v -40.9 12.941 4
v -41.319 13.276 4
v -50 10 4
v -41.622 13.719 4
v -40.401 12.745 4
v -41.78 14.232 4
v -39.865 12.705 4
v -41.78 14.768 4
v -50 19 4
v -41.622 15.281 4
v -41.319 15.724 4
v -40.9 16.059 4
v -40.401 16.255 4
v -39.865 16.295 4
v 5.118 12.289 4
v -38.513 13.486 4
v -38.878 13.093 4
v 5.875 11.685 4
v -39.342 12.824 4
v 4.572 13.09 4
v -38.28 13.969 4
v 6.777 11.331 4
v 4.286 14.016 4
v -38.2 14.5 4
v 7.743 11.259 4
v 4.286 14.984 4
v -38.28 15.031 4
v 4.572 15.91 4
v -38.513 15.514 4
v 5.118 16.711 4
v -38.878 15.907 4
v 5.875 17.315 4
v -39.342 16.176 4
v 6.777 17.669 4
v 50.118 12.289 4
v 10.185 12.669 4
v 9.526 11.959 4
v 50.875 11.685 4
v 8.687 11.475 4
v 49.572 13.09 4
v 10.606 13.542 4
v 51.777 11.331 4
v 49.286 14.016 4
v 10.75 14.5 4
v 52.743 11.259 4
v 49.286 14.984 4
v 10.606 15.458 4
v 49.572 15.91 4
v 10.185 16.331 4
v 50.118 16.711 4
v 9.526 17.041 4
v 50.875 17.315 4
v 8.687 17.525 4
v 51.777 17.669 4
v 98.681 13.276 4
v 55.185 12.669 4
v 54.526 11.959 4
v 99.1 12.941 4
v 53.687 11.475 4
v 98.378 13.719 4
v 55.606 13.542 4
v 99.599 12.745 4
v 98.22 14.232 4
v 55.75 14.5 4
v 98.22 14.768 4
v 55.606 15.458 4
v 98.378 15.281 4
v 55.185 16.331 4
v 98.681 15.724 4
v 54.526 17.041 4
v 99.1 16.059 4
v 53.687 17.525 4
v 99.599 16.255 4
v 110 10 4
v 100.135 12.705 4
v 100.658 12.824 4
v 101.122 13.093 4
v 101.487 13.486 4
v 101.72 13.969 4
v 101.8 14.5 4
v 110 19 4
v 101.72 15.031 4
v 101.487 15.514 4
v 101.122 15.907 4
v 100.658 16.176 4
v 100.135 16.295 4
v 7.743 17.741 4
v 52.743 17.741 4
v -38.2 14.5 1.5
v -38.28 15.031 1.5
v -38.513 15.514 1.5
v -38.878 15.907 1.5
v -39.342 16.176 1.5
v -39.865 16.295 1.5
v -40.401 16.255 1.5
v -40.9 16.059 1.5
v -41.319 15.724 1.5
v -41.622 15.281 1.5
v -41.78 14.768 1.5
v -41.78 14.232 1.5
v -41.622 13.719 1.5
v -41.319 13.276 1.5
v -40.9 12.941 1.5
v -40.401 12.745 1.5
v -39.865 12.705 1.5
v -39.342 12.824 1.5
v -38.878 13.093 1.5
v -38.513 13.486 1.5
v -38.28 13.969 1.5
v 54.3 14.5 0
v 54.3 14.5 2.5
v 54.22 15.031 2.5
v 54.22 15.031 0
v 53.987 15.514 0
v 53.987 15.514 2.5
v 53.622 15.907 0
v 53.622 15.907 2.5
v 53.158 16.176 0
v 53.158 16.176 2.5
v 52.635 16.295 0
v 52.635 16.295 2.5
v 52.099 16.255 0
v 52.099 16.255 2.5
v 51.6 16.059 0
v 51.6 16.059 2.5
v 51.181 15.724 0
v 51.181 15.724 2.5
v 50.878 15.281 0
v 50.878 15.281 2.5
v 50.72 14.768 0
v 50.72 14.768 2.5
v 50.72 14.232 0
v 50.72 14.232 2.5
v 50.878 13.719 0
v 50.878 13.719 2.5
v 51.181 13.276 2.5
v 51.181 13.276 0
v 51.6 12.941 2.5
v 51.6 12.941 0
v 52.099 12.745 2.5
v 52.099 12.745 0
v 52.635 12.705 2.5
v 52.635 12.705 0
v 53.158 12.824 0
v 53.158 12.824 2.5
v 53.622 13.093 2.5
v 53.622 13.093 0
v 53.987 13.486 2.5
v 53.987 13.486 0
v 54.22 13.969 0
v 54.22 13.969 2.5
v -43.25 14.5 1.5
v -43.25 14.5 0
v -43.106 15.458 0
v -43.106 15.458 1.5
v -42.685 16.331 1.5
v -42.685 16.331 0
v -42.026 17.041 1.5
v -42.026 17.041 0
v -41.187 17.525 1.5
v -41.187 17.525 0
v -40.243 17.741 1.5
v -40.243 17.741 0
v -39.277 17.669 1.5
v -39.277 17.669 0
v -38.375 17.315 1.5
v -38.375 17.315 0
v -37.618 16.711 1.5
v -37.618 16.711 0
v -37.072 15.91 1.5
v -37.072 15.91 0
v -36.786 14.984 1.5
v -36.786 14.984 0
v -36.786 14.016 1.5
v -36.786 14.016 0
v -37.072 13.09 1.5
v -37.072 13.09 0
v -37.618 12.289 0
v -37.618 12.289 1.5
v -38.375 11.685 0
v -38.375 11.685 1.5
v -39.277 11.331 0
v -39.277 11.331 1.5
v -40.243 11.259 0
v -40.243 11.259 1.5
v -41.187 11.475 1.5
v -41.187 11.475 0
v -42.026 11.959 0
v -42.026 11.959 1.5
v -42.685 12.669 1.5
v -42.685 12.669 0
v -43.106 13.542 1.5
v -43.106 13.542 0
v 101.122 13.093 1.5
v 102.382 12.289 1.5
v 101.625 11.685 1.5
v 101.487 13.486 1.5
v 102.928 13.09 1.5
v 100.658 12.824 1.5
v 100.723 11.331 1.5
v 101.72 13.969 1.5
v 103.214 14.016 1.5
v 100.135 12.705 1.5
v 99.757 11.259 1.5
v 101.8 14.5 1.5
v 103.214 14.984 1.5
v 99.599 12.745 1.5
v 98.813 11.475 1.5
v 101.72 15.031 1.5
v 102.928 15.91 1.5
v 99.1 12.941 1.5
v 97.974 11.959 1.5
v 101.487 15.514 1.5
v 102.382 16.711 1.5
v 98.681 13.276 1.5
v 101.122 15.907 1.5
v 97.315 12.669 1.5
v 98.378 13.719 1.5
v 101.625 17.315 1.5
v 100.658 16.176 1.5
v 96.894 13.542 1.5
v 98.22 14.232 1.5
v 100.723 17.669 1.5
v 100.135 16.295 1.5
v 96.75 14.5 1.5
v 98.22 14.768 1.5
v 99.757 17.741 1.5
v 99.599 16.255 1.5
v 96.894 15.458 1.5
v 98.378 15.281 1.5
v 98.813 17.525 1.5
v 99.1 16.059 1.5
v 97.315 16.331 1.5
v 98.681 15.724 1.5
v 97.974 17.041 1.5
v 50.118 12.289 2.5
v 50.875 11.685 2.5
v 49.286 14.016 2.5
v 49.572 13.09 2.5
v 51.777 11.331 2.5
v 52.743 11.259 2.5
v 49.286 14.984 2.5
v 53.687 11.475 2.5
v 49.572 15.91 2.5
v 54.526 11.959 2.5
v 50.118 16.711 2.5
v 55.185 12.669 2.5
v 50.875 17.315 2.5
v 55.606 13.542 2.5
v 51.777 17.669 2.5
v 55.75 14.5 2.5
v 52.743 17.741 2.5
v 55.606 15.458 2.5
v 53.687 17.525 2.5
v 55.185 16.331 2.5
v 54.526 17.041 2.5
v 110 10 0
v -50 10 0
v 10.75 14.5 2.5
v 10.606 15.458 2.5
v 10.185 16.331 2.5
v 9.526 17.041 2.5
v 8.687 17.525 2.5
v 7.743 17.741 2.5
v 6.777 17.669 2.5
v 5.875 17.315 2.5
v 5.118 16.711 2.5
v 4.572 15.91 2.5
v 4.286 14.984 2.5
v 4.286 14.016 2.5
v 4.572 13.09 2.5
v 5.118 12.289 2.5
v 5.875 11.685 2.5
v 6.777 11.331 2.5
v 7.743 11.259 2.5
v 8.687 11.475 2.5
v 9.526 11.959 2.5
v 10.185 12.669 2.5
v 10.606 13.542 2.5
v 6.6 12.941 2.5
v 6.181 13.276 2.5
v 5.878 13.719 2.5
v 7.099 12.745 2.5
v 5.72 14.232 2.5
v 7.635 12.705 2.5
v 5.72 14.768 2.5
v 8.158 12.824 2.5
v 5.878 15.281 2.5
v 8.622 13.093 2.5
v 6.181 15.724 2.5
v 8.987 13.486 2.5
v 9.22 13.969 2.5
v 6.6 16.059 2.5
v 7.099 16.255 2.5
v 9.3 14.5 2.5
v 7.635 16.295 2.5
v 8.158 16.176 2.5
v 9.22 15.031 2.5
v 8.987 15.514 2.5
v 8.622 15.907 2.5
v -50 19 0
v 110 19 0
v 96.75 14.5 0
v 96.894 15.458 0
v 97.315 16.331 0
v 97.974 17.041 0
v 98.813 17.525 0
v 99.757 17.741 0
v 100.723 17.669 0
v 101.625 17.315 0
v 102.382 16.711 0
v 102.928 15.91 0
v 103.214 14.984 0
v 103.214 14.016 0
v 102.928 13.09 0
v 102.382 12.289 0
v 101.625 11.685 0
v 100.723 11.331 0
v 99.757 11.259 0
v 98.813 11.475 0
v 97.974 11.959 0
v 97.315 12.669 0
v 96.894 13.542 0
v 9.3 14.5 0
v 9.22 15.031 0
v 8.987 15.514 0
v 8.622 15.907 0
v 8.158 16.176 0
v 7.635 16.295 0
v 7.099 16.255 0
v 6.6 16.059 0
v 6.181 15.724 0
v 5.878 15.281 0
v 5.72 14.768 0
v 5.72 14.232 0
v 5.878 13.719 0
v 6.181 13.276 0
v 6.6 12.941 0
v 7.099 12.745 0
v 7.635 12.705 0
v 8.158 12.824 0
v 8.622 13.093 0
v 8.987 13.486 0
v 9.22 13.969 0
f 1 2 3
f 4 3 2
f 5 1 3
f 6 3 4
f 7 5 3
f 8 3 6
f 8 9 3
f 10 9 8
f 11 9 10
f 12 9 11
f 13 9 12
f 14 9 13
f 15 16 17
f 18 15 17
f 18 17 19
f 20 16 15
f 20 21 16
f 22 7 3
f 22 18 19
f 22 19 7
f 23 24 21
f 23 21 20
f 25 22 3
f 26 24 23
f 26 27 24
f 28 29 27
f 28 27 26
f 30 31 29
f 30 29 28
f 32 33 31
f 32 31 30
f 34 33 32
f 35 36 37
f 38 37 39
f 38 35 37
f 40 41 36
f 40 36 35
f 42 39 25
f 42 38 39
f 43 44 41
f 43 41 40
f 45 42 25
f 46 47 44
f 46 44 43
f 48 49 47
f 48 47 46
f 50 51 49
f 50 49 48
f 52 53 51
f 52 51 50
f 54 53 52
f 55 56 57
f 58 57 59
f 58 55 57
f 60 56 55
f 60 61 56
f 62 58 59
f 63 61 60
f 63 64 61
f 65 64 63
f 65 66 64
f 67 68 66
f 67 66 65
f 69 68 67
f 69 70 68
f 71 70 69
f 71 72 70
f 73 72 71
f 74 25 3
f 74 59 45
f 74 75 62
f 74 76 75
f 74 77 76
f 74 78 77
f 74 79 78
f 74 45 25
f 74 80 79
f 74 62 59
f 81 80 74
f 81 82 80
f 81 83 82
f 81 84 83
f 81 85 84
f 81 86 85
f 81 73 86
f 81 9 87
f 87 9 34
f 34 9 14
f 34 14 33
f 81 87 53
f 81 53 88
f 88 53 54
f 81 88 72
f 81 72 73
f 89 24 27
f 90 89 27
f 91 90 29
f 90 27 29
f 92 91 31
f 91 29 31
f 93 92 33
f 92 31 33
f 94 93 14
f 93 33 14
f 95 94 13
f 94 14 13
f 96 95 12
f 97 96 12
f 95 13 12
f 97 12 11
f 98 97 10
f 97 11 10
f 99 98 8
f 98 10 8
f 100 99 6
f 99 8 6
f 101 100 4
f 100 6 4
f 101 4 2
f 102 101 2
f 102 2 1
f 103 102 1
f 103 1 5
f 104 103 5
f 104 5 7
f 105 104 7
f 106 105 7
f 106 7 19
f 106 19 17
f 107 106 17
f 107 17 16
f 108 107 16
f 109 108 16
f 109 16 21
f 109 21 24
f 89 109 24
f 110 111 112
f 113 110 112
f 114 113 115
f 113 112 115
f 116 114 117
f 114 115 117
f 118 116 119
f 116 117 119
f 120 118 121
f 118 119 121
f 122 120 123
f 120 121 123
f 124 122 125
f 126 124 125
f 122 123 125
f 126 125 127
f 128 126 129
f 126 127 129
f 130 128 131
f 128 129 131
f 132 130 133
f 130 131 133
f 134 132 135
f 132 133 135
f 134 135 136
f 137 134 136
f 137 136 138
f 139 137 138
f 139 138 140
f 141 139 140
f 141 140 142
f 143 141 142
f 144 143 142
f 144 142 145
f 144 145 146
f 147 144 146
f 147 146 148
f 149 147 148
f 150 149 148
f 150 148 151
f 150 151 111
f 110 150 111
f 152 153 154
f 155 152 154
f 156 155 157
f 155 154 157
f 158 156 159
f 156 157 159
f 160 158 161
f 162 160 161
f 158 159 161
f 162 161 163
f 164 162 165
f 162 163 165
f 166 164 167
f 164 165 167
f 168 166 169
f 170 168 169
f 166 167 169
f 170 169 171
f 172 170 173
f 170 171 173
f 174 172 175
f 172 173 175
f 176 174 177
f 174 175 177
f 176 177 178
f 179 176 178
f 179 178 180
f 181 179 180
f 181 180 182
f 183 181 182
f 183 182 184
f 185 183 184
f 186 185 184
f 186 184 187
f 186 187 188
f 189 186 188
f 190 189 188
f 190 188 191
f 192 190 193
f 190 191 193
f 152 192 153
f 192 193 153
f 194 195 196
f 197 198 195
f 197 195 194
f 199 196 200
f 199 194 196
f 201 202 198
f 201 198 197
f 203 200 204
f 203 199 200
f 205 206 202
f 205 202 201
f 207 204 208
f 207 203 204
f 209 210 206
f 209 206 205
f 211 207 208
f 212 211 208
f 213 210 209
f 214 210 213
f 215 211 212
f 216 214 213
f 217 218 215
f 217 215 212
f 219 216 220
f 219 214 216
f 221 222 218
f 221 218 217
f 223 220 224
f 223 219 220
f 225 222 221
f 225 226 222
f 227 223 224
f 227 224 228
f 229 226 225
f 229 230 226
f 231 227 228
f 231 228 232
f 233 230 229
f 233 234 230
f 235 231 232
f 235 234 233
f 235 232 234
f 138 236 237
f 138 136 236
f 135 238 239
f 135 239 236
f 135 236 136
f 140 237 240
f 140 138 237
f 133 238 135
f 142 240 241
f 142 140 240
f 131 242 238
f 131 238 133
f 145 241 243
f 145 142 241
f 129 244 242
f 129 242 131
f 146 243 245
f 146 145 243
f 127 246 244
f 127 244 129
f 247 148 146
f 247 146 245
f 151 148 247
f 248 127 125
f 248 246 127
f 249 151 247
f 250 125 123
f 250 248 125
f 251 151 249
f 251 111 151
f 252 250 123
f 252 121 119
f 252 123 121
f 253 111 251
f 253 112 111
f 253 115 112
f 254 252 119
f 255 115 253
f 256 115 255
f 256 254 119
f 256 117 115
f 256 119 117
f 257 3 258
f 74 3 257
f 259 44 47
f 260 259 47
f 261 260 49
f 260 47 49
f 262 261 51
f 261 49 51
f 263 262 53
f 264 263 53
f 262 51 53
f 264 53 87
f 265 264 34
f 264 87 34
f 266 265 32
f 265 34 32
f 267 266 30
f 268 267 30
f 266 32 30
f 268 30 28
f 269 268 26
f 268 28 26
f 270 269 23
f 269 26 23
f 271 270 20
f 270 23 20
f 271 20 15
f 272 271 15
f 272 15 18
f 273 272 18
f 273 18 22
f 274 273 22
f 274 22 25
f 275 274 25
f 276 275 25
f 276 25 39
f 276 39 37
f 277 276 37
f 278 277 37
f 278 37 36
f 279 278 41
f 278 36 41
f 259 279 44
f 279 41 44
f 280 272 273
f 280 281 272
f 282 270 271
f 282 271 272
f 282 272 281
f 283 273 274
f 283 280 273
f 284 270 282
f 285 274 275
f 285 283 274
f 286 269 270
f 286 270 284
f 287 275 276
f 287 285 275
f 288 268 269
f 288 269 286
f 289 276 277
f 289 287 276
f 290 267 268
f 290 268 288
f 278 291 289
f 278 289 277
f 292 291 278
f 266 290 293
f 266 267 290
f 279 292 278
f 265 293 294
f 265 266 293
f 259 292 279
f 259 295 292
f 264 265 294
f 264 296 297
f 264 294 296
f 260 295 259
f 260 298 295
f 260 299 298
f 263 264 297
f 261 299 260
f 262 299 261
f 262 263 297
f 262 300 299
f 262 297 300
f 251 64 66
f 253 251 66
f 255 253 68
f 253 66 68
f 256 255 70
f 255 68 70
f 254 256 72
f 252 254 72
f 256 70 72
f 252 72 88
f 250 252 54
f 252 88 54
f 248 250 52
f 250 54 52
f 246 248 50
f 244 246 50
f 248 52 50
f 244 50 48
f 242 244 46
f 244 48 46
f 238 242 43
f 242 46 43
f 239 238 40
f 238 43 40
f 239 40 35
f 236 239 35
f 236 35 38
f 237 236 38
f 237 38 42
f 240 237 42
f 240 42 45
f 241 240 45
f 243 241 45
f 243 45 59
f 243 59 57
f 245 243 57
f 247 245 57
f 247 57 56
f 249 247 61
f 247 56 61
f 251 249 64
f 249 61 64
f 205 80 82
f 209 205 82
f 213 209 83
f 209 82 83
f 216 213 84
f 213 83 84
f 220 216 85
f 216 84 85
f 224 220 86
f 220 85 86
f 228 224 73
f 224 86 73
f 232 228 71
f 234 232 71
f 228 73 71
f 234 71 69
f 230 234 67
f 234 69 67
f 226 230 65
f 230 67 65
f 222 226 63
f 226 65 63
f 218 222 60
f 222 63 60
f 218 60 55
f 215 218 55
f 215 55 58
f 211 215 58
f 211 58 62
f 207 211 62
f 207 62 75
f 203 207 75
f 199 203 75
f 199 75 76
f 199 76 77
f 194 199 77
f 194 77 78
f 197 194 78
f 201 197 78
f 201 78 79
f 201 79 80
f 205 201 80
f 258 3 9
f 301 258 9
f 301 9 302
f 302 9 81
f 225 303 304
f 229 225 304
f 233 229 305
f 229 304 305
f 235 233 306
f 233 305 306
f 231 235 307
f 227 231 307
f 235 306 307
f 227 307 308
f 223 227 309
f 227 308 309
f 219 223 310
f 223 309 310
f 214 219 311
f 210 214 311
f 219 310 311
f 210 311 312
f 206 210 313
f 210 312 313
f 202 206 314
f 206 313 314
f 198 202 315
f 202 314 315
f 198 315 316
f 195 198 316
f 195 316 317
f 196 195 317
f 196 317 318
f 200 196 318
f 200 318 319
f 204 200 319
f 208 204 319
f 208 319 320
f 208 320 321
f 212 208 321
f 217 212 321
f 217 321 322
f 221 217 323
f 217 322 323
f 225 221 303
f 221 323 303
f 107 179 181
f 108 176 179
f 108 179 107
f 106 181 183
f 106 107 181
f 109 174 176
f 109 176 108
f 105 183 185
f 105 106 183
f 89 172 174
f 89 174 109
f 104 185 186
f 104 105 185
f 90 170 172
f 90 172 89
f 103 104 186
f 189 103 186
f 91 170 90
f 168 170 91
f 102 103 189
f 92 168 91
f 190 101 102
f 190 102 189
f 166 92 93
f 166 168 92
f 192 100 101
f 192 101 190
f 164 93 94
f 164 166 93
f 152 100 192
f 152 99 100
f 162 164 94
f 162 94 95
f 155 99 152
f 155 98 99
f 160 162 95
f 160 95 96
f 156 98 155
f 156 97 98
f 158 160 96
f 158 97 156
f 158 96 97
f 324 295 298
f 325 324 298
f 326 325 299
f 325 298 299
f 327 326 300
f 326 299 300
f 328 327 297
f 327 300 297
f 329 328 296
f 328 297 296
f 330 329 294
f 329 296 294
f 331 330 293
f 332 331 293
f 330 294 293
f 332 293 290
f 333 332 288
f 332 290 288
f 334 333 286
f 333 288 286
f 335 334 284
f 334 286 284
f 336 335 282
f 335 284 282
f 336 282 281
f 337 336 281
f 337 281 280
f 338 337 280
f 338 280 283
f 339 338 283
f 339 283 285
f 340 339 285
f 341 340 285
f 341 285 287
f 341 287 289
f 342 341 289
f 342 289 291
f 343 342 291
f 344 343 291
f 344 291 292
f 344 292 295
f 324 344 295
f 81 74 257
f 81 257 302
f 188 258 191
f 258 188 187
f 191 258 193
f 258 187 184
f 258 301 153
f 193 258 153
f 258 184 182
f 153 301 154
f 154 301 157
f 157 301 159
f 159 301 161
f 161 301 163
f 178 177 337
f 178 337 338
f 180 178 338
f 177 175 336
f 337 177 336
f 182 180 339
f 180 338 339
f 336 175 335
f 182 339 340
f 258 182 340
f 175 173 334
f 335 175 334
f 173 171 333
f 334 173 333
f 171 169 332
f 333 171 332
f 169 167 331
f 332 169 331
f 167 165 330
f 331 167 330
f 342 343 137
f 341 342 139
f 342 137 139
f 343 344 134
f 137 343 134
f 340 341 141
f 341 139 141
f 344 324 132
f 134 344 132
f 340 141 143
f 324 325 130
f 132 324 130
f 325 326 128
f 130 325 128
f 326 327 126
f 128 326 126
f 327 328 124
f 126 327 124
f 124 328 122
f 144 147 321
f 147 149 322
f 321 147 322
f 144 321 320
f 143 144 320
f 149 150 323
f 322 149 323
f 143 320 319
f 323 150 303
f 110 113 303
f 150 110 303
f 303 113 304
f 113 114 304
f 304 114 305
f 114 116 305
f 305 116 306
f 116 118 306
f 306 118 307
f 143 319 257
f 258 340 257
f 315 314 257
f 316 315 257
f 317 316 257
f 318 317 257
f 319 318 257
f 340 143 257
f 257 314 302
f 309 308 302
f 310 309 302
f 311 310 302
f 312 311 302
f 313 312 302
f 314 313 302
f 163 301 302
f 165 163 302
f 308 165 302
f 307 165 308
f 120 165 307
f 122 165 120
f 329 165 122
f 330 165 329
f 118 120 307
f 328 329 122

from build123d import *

# Parameters (mm, degrees)
SKETCH_1_W          = 60
SKETCH_1_H          = 10
SKETCH_1_R          = 1.8
EXTRUDE_1_DEPTH     = 4
SKETCH_2_R          = 3
CUT_EXTRUDE_1_DEPTH = 2
SKETCH_6_W          = 160
SKETCH_6_H          = 9
EXTRUDE_3_DEPTH     = 4
SKETCH_7_R          = 1.8
CUT_EXTRUDE_4_DEPTH = 4
SKETCH_8_R          = 3.25
CUT_EXTRUDE_5_DEPTH = 1.5
CUT_EXTRUDE_6_REACH = 113.7
SKETCH_9_R          = 1.8
CUT_EXTRUDE_7_REACH = 113.7
SKETCH_10_W         = 60
SKETCH_10_H         = 10
SKETCH_11_R         = 3.25
CUT_EXTRUDE_8_DEPTH = 1.5


with BuildPart() as part:
    # 草图1 → 凸台-拉伸1 (new body)
    with BuildSketch(Plane.XY):
        with Locations((30, 5)):
            Rectangle(SKETCH_1_W, SKETCH_1_H)
        with Locations((7.5, 5)):
            Circle(SKETCH_1_R, mode=Mode.SUBTRACT)
        with Locations((52.5, 5)):
            Circle(SKETCH_1_R, mode=Mode.SUBTRACT)
    extrude(amount=EXTRUDE_1_DEPTH)

    # 草图2 → 切除-拉伸1 (cut)
    with BuildSketch(Plane.XY.offset(4)):
        with Locations((7.5, 5)):
            Circle(SKETCH_2_R)
        with Locations((52.5, 5)):
            Circle(SKETCH_2_R)
    extrude(amount=-CUT_EXTRUDE_1_DEPTH, mode=Mode.SUBTRACT)

    # 草图6 → 凸台-拉伸3 (add)
    with BuildSketch(Plane.XY.offset(4)):
        with Locations((30, 14.5)):
            Rectangle(SKETCH_6_W, SKETCH_6_H)
    extrude(amount=-EXTRUDE_3_DEPTH)

    # 草图7 → 切除-拉伸4 (cut)
    with BuildSketch(Plane.XY.offset(4)):
        with Locations((-40, 14.5)):
            Circle(SKETCH_7_R)
        with Locations((100, 14.5)):
            Circle(SKETCH_7_R)
    extrude(amount=-CUT_EXTRUDE_4_DEPTH, mode=Mode.SUBTRACT)

    # 草图8 → 切除-拉伸5 (cut)
    with BuildSketch(Plane(origin=(0, 0, 0), x_dir=(-1, 0, 0), z_dir=(0, 0, -1))):
        with Locations((-100, 14.5)):
            Circle(SKETCH_8_R)
        with Locations((40, 14.5)):
            Circle(SKETCH_8_R)
    extrude(amount=-CUT_EXTRUDE_5_DEPTH, mode=Mode.SUBTRACT)

    # 草图9 → 切除-拉伸6 (cut, up to next)
    with BuildSketch(Plane.XY.offset(4), mode=Mode.PRIVATE) as cut_extrude_6_sk1:
        with Locations((7.5, 14.5)):
            Circle(SKETCH_9_R)
    cut_extrude_6_tool1 = extrude(cut_extrude_6_sk1.sketch, amount=-CUT_EXTRUDE_6_REACH, mode=Mode.PRIVATE) & part.part
    # 草图9 → 切除-拉伸6 (cut, up to next)
    with BuildSketch(Plane.XY.offset(4), mode=Mode.PRIVATE) as cut_extrude_6_sk2:
        with Locations((52.5, 14.5)):
            Circle(SKETCH_9_R)
    cut_extrude_6_tool2 = extrude(cut_extrude_6_sk2.sketch, amount=-CUT_EXTRUDE_6_REACH, mode=Mode.PRIVATE) & part.part
    add(cut_extrude_6_tool1.solids().sort_by_distance((7.5, 14.5, 4))[0], mode=Mode.SUBTRACT)
    add(cut_extrude_6_tool2.solids().sort_by_distance((52.5, 14.5, 4))[0], mode=Mode.SUBTRACT)

    # 草图10 → 切除-拉伸7 (cut, up to next)
    with BuildSketch(Plane.XY.offset(4), mode=Mode.PRIVATE) as cut_extrude_7_sk1:
        with Locations((30, 5)):
            Rectangle(SKETCH_10_W, SKETCH_10_H)
    cut_extrude_7_tool1 = extrude(cut_extrude_7_sk1.sketch, amount=-CUT_EXTRUDE_7_REACH, mode=Mode.PRIVATE) & part.part
    add(cut_extrude_7_tool1.solids().sort_by_distance((30, 5, 4))[0], mode=Mode.SUBTRACT)

    # 草图11 → 切除-拉伸8 (cut)
    with BuildSketch(Plane.XY.offset(4)):
        with Locations((7.5, 14.5)):
            Circle(SKETCH_11_R)
        with Locations((52.5, 14.5)):
            Circle(SKETCH_11_R)
    extrude(amount=-CUT_EXTRUDE_8_DEPTH, mode=Mode.SUBTRACT)


solid = part.part
